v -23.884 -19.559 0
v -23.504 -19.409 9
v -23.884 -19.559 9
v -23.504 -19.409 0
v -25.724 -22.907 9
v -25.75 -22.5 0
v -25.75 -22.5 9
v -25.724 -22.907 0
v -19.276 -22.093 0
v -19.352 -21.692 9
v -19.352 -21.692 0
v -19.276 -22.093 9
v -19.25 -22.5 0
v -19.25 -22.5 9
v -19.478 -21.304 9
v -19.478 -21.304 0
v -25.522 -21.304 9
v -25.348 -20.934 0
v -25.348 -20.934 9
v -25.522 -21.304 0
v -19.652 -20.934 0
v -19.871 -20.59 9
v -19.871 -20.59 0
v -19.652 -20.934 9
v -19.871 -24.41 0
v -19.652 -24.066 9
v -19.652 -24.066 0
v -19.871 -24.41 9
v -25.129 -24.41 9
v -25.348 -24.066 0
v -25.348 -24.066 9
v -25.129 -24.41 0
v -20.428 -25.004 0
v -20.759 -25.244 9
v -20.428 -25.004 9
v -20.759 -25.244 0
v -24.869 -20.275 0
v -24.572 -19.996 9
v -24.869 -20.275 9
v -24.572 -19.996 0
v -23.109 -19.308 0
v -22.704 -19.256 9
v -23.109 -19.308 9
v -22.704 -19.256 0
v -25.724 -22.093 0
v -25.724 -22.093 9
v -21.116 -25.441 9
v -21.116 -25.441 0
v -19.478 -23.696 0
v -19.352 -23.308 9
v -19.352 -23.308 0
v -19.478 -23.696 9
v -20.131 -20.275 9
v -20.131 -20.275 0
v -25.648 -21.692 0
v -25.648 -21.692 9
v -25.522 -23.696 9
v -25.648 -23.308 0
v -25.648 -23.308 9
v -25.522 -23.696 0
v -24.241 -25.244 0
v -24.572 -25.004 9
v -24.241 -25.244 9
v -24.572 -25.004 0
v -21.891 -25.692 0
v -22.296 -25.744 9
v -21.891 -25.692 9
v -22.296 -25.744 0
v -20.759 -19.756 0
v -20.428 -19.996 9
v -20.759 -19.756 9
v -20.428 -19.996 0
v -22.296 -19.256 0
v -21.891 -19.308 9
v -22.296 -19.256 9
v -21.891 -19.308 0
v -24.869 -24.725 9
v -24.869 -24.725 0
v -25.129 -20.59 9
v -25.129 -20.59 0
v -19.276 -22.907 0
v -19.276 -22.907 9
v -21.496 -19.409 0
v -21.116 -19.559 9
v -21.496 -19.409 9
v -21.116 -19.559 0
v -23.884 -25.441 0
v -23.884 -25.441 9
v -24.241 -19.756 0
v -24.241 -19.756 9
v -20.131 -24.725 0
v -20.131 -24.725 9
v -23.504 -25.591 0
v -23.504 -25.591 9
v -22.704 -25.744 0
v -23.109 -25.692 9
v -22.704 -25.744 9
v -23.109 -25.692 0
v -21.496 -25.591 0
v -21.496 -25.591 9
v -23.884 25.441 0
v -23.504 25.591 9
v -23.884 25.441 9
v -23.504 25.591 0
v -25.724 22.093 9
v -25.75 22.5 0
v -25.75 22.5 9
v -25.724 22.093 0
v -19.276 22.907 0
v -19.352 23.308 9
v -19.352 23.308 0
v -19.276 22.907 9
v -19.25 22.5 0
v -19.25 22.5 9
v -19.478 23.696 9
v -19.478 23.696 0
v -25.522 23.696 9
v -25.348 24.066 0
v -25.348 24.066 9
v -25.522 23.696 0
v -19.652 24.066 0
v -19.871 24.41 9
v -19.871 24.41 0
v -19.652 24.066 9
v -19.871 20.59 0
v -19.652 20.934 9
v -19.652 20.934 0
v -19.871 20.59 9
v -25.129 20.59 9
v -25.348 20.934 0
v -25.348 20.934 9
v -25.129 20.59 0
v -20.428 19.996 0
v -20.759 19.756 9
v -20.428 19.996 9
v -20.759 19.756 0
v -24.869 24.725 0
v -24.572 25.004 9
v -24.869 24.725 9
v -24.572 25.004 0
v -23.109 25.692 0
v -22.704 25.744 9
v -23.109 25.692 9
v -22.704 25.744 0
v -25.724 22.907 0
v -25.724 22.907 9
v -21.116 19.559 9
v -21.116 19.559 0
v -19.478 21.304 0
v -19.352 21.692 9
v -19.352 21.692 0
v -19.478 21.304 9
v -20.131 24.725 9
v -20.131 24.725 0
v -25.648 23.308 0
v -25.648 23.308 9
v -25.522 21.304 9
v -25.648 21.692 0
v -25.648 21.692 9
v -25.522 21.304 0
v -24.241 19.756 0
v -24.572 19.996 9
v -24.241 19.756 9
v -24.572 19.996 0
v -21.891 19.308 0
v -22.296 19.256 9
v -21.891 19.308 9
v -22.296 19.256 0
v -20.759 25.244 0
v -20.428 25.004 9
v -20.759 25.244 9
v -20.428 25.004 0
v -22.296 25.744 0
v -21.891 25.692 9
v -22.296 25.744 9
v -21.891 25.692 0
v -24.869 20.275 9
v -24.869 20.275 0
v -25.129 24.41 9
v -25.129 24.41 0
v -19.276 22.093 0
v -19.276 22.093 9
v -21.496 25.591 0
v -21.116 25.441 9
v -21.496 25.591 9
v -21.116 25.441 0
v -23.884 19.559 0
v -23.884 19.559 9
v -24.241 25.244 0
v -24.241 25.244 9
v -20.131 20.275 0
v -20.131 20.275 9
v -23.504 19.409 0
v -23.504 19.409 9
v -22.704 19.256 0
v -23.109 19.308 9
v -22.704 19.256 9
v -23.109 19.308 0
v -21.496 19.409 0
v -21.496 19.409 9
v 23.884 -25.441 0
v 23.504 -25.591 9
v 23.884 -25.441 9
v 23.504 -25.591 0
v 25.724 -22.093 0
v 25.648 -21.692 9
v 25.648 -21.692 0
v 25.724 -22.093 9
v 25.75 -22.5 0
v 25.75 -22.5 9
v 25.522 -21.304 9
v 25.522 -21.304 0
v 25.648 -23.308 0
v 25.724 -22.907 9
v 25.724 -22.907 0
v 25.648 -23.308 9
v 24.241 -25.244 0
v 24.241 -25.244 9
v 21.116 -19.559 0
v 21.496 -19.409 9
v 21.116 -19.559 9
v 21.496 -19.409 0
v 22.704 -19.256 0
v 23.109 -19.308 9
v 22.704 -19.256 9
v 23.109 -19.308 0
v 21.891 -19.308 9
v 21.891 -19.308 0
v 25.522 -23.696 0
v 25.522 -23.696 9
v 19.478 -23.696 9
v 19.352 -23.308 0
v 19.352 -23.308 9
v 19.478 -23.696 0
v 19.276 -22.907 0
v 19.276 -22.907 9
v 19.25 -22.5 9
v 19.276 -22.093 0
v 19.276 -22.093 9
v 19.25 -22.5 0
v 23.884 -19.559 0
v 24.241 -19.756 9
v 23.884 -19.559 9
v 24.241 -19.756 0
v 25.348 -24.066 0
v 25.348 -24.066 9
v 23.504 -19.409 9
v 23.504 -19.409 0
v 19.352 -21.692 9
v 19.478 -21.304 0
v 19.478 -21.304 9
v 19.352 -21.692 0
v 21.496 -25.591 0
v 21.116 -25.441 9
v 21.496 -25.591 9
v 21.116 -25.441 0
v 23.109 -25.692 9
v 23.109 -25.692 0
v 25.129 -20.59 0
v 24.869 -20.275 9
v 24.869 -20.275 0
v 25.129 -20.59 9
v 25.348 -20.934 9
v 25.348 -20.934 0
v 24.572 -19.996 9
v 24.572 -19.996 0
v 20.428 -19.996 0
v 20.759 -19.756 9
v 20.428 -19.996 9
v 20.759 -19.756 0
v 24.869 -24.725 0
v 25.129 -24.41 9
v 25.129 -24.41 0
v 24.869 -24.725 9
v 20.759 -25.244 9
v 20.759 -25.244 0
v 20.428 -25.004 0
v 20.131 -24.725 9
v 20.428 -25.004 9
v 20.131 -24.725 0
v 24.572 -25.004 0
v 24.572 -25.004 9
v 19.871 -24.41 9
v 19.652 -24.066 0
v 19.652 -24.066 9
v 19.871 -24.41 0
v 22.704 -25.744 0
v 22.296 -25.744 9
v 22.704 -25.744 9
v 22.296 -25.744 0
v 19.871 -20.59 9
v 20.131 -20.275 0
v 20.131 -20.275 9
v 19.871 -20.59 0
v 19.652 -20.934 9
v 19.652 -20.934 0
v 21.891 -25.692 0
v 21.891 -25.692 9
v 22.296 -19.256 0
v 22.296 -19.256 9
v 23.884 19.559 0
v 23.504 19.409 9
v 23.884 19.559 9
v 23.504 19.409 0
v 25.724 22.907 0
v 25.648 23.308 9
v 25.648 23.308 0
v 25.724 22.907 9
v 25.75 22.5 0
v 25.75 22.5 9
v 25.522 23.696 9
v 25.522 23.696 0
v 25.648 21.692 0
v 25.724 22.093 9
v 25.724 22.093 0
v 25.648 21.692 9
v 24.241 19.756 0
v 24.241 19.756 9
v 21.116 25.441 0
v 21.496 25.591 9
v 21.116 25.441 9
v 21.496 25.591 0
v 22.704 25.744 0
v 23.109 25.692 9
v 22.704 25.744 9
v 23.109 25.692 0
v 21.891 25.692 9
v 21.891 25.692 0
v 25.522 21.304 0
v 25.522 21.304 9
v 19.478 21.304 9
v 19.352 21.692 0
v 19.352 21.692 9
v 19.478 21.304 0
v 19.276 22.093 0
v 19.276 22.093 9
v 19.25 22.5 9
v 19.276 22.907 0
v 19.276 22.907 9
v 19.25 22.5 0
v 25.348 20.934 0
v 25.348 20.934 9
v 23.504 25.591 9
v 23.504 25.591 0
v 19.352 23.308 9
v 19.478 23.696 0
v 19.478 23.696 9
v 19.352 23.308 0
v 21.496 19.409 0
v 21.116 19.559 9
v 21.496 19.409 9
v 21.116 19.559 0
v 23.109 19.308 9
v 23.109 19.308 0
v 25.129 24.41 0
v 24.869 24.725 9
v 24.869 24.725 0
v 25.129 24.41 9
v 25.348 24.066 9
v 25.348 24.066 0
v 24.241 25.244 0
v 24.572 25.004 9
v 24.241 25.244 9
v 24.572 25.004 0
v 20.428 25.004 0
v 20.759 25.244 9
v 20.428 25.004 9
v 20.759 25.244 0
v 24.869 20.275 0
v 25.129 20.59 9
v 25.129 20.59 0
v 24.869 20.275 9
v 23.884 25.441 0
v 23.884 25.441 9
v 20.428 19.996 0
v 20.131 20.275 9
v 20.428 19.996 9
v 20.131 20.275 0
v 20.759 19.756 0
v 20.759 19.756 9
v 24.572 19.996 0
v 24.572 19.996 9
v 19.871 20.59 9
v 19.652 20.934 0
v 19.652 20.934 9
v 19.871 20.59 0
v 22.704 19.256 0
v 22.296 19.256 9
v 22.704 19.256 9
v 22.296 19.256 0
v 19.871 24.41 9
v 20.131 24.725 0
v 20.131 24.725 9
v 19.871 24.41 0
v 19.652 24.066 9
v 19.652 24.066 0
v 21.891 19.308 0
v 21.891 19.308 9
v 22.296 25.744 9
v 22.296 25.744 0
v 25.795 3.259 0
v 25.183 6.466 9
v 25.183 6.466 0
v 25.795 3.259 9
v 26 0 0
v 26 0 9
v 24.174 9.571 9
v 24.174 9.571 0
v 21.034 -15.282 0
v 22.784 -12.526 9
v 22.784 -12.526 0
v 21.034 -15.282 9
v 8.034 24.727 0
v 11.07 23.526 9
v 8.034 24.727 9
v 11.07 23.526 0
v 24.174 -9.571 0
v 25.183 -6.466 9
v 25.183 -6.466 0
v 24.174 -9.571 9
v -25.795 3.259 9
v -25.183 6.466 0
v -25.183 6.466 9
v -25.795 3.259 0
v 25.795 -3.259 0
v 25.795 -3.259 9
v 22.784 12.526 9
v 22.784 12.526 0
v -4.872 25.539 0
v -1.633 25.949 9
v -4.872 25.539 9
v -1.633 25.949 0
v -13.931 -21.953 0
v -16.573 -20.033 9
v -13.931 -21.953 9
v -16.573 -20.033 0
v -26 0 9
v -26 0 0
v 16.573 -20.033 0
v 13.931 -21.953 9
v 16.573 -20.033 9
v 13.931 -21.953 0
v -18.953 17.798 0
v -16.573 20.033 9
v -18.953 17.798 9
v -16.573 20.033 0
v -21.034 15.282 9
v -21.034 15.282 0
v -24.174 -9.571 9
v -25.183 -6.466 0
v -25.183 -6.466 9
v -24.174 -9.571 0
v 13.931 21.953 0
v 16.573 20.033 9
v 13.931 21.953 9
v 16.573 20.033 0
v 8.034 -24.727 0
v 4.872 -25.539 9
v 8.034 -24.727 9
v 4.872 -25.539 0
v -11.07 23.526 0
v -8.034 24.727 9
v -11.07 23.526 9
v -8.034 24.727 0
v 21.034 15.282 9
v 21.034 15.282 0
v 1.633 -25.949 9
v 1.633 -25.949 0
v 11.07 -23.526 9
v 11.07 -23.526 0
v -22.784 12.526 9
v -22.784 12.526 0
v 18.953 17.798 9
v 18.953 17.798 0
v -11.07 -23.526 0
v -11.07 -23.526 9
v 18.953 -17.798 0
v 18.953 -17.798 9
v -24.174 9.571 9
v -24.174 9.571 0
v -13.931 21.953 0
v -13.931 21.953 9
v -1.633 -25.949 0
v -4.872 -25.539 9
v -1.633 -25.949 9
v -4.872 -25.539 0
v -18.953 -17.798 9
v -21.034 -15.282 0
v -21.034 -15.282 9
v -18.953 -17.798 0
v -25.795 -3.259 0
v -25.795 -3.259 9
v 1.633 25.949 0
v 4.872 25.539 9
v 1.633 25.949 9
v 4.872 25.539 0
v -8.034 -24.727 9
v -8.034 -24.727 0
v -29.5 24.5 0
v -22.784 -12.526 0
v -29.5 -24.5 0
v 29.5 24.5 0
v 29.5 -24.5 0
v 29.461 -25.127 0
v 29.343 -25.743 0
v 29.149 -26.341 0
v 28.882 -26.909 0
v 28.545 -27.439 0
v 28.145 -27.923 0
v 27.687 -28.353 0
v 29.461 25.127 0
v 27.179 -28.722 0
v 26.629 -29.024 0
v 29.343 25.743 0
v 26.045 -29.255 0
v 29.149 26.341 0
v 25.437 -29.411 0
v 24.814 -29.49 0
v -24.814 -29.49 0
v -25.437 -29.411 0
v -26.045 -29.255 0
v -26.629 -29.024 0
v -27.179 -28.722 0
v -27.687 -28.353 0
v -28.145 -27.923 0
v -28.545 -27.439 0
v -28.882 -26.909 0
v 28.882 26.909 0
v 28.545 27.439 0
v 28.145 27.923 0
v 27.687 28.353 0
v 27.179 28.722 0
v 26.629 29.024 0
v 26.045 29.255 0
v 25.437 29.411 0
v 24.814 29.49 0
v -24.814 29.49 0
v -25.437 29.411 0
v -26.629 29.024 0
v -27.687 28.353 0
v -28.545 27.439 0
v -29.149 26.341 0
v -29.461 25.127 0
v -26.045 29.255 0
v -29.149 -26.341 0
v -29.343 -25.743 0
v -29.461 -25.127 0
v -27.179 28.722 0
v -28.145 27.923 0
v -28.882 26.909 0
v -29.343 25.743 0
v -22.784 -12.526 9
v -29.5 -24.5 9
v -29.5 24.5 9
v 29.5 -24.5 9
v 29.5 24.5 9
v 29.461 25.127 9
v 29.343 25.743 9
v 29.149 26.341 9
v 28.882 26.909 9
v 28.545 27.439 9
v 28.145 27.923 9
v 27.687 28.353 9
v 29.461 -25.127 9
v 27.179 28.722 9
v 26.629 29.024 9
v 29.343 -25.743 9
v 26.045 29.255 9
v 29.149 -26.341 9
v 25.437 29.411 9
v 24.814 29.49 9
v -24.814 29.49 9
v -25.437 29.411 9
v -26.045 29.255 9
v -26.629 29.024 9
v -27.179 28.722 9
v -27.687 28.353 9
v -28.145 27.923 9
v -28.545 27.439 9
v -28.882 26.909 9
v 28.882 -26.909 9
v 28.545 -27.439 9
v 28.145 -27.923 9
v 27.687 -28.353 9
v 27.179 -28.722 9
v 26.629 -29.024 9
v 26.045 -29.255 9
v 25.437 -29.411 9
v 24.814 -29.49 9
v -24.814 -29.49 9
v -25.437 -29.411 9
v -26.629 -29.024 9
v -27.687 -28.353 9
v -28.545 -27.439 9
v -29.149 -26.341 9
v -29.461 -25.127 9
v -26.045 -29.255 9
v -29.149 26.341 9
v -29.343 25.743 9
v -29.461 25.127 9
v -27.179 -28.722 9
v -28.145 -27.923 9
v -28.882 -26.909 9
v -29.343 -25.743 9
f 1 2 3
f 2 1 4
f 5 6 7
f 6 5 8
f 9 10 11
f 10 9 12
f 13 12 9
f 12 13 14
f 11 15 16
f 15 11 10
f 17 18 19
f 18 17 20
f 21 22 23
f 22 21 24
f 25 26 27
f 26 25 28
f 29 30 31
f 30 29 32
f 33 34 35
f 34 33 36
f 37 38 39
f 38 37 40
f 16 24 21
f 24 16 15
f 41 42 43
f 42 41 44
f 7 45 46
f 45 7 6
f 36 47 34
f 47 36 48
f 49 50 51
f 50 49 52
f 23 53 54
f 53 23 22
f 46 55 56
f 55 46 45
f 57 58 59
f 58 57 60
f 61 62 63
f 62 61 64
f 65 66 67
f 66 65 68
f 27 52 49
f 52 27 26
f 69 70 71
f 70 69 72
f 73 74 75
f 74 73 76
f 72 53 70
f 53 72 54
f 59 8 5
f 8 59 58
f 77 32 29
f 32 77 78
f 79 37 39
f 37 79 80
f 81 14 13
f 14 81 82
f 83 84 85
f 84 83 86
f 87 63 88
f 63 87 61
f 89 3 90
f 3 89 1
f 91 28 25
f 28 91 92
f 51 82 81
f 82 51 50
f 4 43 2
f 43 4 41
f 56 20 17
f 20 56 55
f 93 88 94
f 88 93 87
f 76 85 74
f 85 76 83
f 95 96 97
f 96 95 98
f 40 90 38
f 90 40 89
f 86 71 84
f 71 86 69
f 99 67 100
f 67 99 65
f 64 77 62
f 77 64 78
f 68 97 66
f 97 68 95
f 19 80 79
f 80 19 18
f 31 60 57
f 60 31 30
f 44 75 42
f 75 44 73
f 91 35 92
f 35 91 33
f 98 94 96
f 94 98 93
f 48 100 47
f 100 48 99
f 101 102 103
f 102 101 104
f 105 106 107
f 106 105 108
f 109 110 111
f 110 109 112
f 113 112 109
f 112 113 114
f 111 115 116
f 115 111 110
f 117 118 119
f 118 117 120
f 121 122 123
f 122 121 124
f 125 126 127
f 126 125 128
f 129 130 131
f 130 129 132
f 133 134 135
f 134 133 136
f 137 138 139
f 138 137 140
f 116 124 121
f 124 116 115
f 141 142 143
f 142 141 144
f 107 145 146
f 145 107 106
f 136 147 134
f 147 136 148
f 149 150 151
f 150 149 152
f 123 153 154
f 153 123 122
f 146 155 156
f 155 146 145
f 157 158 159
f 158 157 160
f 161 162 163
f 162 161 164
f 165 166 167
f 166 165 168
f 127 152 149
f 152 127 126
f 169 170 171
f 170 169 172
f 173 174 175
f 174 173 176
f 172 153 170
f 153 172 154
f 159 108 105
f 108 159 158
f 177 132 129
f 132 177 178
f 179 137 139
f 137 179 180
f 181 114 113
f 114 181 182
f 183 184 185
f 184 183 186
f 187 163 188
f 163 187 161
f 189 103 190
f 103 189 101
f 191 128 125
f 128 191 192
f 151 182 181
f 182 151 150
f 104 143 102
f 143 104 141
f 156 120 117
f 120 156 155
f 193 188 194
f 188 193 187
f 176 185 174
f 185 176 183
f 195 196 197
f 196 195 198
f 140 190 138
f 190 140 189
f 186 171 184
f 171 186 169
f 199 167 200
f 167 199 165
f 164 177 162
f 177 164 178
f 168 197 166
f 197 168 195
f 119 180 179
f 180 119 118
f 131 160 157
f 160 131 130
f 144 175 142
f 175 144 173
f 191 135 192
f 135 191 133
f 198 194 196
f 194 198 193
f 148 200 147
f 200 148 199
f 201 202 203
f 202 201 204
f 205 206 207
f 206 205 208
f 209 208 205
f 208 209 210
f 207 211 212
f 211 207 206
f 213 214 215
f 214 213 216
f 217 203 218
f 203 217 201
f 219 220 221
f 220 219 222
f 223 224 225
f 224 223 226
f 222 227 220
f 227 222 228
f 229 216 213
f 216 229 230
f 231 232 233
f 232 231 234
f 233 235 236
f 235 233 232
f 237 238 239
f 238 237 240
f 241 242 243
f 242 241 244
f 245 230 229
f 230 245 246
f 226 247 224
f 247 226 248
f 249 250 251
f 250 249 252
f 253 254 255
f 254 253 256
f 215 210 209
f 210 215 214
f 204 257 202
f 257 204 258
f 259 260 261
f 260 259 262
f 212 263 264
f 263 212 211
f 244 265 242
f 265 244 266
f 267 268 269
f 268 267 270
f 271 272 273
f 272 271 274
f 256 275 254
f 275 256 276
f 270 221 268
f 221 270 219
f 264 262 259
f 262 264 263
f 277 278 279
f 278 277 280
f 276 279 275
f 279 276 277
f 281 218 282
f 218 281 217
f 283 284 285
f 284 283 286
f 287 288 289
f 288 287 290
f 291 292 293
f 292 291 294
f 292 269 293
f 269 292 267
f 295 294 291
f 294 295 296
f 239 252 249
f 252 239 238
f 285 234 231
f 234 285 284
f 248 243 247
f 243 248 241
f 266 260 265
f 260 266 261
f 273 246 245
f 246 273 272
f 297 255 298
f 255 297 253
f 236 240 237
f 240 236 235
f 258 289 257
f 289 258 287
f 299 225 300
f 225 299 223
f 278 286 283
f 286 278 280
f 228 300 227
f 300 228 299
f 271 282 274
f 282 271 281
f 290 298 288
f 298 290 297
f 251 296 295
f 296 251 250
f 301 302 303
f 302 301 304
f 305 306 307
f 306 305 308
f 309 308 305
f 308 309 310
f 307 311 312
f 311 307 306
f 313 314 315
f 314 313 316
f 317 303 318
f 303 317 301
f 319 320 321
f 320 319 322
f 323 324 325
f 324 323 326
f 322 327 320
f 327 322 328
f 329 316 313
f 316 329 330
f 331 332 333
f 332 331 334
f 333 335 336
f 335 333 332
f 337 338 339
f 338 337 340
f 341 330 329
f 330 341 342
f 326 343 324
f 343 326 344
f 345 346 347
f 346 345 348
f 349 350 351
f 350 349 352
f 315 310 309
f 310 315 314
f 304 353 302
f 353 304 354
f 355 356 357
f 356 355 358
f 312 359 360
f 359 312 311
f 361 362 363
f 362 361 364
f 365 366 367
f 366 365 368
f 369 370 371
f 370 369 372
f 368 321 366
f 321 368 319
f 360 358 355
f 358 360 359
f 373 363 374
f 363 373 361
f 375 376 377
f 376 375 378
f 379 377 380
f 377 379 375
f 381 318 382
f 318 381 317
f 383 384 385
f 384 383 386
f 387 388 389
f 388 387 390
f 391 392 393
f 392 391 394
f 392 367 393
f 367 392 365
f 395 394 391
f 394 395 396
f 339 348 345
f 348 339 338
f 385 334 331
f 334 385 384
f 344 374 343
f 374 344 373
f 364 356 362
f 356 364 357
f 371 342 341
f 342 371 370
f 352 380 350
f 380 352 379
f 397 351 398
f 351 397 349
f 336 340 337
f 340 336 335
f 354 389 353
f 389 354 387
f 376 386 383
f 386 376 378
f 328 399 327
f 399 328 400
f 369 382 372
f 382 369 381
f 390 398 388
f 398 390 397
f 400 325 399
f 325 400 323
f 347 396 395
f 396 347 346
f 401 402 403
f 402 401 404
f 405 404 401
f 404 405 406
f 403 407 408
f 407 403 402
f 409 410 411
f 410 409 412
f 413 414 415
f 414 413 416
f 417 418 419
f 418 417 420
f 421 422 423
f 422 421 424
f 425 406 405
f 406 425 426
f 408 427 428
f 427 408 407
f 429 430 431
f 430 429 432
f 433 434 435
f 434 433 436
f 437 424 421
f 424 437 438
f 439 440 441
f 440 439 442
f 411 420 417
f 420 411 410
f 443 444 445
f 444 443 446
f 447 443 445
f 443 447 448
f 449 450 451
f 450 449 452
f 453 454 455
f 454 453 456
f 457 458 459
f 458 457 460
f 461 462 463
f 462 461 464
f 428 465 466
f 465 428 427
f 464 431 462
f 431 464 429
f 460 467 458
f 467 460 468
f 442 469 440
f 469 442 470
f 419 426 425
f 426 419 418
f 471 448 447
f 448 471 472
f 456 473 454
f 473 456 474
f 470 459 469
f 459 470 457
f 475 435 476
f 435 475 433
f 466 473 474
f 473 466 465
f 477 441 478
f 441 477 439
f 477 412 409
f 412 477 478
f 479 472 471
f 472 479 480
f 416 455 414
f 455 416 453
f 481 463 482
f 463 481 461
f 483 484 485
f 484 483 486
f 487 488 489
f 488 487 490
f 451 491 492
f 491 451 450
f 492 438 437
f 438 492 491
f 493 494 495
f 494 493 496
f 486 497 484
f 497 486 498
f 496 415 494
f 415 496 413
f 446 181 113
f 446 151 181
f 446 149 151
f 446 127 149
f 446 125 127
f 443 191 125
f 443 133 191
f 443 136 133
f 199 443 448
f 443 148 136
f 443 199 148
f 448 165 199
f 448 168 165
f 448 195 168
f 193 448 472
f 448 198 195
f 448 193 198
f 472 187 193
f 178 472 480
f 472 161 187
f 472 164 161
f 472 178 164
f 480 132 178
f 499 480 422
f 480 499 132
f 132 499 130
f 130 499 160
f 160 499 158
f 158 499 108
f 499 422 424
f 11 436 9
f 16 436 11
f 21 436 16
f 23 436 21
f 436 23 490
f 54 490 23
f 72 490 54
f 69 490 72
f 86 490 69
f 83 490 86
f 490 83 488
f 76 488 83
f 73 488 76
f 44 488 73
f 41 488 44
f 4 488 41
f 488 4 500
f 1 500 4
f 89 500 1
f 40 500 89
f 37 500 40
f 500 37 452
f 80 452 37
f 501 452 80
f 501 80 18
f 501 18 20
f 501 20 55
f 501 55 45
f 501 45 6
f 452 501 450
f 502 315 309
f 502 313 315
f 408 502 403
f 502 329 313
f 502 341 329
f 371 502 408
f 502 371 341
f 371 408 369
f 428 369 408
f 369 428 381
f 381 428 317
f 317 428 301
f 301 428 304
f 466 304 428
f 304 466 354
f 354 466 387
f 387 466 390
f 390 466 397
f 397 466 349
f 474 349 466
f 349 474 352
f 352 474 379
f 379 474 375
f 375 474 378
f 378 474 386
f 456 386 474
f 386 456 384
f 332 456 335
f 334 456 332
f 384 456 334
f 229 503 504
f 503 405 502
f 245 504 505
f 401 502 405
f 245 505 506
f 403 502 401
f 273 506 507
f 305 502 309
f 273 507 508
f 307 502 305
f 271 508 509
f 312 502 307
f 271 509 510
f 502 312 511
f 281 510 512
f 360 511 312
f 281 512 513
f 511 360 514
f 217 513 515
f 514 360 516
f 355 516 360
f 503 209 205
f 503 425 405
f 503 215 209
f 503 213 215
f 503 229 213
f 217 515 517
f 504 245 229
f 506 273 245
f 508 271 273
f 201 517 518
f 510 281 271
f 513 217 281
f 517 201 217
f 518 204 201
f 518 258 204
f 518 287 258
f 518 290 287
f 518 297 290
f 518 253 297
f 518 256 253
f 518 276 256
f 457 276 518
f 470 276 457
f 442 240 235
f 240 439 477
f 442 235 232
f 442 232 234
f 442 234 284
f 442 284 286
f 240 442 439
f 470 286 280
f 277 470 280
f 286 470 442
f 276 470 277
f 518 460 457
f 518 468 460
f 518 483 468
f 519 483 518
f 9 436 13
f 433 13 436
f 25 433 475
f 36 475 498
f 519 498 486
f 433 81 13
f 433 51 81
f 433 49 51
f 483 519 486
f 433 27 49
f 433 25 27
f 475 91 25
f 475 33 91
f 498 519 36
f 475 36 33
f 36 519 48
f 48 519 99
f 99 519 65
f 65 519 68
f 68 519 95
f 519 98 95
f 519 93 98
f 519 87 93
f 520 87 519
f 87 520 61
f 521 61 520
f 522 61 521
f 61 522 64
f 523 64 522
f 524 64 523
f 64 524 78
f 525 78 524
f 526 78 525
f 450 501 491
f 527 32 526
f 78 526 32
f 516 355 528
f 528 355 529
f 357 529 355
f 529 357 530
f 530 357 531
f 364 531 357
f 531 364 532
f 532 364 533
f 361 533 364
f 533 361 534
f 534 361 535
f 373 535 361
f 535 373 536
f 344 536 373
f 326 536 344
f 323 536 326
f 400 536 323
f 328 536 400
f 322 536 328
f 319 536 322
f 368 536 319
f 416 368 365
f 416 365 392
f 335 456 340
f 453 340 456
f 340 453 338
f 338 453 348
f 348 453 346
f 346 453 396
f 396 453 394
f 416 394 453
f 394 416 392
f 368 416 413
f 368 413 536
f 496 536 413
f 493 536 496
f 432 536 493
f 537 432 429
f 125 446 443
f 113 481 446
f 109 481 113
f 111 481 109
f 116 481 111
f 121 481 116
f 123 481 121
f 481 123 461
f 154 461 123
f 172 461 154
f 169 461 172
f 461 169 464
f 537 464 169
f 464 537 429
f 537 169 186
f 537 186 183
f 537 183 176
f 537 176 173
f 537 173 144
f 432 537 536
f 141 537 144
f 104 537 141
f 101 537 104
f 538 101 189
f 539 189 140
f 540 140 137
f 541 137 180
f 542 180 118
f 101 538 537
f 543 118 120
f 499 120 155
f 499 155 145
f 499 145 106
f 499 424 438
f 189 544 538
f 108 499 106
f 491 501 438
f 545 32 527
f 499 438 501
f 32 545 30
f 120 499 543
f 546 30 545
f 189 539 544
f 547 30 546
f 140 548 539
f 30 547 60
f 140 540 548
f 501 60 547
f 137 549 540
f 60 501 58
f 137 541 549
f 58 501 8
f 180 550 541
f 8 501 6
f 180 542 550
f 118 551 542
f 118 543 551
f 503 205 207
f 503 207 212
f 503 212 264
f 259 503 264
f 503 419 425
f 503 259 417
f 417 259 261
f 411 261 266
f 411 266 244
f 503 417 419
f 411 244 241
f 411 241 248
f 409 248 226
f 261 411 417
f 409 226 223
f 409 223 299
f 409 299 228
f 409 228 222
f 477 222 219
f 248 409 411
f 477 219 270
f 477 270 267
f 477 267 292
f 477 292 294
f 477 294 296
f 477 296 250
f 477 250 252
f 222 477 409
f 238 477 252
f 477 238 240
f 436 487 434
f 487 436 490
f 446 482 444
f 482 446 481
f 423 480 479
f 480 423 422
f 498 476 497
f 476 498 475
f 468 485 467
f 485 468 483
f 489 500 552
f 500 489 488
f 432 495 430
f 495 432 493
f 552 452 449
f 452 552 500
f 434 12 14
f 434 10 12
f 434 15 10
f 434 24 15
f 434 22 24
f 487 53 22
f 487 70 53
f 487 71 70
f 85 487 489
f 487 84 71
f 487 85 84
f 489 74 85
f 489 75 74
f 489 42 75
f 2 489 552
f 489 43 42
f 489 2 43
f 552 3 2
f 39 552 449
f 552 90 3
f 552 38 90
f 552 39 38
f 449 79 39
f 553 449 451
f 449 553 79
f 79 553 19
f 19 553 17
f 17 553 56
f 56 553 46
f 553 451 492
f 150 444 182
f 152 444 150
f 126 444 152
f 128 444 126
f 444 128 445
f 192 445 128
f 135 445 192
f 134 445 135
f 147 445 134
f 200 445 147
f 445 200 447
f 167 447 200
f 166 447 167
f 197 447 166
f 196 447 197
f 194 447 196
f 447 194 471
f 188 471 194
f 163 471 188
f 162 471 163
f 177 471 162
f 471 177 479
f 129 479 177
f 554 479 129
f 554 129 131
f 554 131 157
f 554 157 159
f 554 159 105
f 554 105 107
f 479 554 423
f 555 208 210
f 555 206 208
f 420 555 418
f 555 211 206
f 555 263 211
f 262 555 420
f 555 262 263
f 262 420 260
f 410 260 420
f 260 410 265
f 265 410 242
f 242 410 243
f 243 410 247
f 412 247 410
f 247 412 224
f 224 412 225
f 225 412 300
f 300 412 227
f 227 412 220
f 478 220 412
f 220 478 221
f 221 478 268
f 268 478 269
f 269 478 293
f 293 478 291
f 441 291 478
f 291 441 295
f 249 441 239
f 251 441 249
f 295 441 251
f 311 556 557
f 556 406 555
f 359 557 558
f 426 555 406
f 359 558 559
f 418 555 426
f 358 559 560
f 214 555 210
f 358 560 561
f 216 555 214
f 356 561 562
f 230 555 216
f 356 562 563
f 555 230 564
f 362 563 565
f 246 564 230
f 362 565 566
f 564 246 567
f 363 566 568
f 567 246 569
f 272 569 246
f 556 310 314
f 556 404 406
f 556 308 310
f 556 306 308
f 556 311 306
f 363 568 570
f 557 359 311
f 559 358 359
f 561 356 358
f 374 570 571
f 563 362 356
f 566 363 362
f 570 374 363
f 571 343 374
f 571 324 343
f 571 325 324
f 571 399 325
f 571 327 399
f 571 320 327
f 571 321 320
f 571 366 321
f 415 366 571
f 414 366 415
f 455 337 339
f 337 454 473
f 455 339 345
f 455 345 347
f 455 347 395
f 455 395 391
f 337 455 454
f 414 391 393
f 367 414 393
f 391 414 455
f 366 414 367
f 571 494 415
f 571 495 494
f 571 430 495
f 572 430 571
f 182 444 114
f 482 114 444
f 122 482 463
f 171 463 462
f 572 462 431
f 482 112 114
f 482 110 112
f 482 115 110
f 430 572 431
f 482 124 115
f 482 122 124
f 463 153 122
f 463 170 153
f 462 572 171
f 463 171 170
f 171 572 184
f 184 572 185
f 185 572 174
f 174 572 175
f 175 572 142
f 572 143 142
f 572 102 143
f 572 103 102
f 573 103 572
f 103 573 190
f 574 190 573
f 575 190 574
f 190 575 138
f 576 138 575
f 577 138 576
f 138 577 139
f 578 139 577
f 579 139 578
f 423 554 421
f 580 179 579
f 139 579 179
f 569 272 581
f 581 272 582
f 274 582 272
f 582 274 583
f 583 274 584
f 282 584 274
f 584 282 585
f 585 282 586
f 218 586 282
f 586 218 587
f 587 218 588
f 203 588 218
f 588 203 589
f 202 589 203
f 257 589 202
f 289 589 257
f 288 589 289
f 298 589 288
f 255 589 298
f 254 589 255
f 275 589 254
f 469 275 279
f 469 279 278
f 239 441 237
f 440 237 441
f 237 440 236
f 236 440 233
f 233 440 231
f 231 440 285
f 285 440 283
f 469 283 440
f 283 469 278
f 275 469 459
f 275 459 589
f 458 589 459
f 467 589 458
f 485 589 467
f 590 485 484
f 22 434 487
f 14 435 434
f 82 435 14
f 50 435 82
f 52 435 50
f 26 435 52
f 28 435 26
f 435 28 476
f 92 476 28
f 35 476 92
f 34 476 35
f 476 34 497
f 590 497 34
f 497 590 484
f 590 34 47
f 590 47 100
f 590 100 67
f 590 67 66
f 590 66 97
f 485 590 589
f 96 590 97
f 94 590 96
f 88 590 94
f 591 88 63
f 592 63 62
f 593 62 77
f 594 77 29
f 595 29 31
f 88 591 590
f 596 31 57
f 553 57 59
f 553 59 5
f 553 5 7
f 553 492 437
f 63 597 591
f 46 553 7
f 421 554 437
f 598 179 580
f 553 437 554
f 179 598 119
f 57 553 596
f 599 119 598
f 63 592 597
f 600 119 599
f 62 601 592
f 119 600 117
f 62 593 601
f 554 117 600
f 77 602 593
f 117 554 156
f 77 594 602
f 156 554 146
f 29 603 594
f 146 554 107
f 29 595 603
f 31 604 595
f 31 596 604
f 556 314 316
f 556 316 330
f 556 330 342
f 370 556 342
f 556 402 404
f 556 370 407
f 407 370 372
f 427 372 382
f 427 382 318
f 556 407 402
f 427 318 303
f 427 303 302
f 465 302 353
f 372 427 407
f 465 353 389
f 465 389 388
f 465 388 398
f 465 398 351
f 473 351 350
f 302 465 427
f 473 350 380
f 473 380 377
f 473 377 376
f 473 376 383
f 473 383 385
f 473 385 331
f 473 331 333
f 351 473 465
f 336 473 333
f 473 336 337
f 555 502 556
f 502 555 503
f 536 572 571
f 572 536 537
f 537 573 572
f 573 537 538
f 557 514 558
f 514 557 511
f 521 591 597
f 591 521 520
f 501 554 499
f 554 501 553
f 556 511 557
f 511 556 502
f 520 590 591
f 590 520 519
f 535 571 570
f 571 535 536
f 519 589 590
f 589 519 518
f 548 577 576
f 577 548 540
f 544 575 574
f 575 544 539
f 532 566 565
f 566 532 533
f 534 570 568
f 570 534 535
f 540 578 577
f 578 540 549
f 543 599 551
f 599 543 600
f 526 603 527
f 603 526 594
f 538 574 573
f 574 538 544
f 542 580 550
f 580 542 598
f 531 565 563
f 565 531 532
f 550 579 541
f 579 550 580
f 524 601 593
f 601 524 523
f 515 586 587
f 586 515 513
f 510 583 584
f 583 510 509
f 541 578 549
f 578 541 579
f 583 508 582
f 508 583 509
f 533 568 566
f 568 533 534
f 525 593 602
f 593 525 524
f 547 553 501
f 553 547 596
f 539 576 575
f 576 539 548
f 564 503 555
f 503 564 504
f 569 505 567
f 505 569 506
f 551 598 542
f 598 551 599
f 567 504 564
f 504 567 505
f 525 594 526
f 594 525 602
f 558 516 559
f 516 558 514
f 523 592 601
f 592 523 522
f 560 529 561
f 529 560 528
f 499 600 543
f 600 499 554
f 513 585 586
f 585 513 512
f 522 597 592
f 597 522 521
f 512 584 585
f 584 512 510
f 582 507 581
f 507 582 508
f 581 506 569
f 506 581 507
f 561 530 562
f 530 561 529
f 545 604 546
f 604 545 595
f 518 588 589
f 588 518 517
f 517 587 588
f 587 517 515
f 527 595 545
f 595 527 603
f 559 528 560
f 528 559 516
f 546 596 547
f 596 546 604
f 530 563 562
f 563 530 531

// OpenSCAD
$fn = 50;

difference() {
	union() {
		hull() {
			translate(v = [-24.5, 24.5, 0]) {
				cylinder(h = 9, r = 5);
			}
			translate(v = [24.5, 24.5, 0]) {
				cylinder(h = 9, r = 5);
			}
			translate(v = [-24.5, -24.5, 0]) {
				cylinder(h = 9, r = 5);
			}
			translate(v = [24.5, -24.5, 0]) {
				cylinder(h = 9, r = 5);
			}
		}
	}
	union() {
		translate(v = [-22.5, -22.5, -100.0]) {
			cylinder(h = 200, r = 3.25);
		}
		translate(v = [-22.5, 22.5, -100.0]) {
			cylinder(h = 200, r = 3.25);
		}
		translate(v = [22.5, -22.5, -100.0]) {
			cylinder(h = 200, r = 3.25);
		}
		translate(v = [22.5, 22.5, -100.0]) {
			cylinder(h = 200, r = 3.25);
		}
		translate(v = [-22.5, -22.5, -100.0]) {
			cylinder(h = 200, r = 1.8);
		}
		translate(v = [-22.5, 22.5, -100.0]) {
			cylinder(h = 200, r = 1.8);
		}
		translate(v = [22.5, -22.5, -100.0]) {
			cylinder(h = 200, r = 1.8);
		}
		translate(v = [22.5, 22.5, -100.0]) {
			cylinder(h = 200, r = 1.8);
		}
		cylinder(h = 9, r = 26.0);
	}
}
